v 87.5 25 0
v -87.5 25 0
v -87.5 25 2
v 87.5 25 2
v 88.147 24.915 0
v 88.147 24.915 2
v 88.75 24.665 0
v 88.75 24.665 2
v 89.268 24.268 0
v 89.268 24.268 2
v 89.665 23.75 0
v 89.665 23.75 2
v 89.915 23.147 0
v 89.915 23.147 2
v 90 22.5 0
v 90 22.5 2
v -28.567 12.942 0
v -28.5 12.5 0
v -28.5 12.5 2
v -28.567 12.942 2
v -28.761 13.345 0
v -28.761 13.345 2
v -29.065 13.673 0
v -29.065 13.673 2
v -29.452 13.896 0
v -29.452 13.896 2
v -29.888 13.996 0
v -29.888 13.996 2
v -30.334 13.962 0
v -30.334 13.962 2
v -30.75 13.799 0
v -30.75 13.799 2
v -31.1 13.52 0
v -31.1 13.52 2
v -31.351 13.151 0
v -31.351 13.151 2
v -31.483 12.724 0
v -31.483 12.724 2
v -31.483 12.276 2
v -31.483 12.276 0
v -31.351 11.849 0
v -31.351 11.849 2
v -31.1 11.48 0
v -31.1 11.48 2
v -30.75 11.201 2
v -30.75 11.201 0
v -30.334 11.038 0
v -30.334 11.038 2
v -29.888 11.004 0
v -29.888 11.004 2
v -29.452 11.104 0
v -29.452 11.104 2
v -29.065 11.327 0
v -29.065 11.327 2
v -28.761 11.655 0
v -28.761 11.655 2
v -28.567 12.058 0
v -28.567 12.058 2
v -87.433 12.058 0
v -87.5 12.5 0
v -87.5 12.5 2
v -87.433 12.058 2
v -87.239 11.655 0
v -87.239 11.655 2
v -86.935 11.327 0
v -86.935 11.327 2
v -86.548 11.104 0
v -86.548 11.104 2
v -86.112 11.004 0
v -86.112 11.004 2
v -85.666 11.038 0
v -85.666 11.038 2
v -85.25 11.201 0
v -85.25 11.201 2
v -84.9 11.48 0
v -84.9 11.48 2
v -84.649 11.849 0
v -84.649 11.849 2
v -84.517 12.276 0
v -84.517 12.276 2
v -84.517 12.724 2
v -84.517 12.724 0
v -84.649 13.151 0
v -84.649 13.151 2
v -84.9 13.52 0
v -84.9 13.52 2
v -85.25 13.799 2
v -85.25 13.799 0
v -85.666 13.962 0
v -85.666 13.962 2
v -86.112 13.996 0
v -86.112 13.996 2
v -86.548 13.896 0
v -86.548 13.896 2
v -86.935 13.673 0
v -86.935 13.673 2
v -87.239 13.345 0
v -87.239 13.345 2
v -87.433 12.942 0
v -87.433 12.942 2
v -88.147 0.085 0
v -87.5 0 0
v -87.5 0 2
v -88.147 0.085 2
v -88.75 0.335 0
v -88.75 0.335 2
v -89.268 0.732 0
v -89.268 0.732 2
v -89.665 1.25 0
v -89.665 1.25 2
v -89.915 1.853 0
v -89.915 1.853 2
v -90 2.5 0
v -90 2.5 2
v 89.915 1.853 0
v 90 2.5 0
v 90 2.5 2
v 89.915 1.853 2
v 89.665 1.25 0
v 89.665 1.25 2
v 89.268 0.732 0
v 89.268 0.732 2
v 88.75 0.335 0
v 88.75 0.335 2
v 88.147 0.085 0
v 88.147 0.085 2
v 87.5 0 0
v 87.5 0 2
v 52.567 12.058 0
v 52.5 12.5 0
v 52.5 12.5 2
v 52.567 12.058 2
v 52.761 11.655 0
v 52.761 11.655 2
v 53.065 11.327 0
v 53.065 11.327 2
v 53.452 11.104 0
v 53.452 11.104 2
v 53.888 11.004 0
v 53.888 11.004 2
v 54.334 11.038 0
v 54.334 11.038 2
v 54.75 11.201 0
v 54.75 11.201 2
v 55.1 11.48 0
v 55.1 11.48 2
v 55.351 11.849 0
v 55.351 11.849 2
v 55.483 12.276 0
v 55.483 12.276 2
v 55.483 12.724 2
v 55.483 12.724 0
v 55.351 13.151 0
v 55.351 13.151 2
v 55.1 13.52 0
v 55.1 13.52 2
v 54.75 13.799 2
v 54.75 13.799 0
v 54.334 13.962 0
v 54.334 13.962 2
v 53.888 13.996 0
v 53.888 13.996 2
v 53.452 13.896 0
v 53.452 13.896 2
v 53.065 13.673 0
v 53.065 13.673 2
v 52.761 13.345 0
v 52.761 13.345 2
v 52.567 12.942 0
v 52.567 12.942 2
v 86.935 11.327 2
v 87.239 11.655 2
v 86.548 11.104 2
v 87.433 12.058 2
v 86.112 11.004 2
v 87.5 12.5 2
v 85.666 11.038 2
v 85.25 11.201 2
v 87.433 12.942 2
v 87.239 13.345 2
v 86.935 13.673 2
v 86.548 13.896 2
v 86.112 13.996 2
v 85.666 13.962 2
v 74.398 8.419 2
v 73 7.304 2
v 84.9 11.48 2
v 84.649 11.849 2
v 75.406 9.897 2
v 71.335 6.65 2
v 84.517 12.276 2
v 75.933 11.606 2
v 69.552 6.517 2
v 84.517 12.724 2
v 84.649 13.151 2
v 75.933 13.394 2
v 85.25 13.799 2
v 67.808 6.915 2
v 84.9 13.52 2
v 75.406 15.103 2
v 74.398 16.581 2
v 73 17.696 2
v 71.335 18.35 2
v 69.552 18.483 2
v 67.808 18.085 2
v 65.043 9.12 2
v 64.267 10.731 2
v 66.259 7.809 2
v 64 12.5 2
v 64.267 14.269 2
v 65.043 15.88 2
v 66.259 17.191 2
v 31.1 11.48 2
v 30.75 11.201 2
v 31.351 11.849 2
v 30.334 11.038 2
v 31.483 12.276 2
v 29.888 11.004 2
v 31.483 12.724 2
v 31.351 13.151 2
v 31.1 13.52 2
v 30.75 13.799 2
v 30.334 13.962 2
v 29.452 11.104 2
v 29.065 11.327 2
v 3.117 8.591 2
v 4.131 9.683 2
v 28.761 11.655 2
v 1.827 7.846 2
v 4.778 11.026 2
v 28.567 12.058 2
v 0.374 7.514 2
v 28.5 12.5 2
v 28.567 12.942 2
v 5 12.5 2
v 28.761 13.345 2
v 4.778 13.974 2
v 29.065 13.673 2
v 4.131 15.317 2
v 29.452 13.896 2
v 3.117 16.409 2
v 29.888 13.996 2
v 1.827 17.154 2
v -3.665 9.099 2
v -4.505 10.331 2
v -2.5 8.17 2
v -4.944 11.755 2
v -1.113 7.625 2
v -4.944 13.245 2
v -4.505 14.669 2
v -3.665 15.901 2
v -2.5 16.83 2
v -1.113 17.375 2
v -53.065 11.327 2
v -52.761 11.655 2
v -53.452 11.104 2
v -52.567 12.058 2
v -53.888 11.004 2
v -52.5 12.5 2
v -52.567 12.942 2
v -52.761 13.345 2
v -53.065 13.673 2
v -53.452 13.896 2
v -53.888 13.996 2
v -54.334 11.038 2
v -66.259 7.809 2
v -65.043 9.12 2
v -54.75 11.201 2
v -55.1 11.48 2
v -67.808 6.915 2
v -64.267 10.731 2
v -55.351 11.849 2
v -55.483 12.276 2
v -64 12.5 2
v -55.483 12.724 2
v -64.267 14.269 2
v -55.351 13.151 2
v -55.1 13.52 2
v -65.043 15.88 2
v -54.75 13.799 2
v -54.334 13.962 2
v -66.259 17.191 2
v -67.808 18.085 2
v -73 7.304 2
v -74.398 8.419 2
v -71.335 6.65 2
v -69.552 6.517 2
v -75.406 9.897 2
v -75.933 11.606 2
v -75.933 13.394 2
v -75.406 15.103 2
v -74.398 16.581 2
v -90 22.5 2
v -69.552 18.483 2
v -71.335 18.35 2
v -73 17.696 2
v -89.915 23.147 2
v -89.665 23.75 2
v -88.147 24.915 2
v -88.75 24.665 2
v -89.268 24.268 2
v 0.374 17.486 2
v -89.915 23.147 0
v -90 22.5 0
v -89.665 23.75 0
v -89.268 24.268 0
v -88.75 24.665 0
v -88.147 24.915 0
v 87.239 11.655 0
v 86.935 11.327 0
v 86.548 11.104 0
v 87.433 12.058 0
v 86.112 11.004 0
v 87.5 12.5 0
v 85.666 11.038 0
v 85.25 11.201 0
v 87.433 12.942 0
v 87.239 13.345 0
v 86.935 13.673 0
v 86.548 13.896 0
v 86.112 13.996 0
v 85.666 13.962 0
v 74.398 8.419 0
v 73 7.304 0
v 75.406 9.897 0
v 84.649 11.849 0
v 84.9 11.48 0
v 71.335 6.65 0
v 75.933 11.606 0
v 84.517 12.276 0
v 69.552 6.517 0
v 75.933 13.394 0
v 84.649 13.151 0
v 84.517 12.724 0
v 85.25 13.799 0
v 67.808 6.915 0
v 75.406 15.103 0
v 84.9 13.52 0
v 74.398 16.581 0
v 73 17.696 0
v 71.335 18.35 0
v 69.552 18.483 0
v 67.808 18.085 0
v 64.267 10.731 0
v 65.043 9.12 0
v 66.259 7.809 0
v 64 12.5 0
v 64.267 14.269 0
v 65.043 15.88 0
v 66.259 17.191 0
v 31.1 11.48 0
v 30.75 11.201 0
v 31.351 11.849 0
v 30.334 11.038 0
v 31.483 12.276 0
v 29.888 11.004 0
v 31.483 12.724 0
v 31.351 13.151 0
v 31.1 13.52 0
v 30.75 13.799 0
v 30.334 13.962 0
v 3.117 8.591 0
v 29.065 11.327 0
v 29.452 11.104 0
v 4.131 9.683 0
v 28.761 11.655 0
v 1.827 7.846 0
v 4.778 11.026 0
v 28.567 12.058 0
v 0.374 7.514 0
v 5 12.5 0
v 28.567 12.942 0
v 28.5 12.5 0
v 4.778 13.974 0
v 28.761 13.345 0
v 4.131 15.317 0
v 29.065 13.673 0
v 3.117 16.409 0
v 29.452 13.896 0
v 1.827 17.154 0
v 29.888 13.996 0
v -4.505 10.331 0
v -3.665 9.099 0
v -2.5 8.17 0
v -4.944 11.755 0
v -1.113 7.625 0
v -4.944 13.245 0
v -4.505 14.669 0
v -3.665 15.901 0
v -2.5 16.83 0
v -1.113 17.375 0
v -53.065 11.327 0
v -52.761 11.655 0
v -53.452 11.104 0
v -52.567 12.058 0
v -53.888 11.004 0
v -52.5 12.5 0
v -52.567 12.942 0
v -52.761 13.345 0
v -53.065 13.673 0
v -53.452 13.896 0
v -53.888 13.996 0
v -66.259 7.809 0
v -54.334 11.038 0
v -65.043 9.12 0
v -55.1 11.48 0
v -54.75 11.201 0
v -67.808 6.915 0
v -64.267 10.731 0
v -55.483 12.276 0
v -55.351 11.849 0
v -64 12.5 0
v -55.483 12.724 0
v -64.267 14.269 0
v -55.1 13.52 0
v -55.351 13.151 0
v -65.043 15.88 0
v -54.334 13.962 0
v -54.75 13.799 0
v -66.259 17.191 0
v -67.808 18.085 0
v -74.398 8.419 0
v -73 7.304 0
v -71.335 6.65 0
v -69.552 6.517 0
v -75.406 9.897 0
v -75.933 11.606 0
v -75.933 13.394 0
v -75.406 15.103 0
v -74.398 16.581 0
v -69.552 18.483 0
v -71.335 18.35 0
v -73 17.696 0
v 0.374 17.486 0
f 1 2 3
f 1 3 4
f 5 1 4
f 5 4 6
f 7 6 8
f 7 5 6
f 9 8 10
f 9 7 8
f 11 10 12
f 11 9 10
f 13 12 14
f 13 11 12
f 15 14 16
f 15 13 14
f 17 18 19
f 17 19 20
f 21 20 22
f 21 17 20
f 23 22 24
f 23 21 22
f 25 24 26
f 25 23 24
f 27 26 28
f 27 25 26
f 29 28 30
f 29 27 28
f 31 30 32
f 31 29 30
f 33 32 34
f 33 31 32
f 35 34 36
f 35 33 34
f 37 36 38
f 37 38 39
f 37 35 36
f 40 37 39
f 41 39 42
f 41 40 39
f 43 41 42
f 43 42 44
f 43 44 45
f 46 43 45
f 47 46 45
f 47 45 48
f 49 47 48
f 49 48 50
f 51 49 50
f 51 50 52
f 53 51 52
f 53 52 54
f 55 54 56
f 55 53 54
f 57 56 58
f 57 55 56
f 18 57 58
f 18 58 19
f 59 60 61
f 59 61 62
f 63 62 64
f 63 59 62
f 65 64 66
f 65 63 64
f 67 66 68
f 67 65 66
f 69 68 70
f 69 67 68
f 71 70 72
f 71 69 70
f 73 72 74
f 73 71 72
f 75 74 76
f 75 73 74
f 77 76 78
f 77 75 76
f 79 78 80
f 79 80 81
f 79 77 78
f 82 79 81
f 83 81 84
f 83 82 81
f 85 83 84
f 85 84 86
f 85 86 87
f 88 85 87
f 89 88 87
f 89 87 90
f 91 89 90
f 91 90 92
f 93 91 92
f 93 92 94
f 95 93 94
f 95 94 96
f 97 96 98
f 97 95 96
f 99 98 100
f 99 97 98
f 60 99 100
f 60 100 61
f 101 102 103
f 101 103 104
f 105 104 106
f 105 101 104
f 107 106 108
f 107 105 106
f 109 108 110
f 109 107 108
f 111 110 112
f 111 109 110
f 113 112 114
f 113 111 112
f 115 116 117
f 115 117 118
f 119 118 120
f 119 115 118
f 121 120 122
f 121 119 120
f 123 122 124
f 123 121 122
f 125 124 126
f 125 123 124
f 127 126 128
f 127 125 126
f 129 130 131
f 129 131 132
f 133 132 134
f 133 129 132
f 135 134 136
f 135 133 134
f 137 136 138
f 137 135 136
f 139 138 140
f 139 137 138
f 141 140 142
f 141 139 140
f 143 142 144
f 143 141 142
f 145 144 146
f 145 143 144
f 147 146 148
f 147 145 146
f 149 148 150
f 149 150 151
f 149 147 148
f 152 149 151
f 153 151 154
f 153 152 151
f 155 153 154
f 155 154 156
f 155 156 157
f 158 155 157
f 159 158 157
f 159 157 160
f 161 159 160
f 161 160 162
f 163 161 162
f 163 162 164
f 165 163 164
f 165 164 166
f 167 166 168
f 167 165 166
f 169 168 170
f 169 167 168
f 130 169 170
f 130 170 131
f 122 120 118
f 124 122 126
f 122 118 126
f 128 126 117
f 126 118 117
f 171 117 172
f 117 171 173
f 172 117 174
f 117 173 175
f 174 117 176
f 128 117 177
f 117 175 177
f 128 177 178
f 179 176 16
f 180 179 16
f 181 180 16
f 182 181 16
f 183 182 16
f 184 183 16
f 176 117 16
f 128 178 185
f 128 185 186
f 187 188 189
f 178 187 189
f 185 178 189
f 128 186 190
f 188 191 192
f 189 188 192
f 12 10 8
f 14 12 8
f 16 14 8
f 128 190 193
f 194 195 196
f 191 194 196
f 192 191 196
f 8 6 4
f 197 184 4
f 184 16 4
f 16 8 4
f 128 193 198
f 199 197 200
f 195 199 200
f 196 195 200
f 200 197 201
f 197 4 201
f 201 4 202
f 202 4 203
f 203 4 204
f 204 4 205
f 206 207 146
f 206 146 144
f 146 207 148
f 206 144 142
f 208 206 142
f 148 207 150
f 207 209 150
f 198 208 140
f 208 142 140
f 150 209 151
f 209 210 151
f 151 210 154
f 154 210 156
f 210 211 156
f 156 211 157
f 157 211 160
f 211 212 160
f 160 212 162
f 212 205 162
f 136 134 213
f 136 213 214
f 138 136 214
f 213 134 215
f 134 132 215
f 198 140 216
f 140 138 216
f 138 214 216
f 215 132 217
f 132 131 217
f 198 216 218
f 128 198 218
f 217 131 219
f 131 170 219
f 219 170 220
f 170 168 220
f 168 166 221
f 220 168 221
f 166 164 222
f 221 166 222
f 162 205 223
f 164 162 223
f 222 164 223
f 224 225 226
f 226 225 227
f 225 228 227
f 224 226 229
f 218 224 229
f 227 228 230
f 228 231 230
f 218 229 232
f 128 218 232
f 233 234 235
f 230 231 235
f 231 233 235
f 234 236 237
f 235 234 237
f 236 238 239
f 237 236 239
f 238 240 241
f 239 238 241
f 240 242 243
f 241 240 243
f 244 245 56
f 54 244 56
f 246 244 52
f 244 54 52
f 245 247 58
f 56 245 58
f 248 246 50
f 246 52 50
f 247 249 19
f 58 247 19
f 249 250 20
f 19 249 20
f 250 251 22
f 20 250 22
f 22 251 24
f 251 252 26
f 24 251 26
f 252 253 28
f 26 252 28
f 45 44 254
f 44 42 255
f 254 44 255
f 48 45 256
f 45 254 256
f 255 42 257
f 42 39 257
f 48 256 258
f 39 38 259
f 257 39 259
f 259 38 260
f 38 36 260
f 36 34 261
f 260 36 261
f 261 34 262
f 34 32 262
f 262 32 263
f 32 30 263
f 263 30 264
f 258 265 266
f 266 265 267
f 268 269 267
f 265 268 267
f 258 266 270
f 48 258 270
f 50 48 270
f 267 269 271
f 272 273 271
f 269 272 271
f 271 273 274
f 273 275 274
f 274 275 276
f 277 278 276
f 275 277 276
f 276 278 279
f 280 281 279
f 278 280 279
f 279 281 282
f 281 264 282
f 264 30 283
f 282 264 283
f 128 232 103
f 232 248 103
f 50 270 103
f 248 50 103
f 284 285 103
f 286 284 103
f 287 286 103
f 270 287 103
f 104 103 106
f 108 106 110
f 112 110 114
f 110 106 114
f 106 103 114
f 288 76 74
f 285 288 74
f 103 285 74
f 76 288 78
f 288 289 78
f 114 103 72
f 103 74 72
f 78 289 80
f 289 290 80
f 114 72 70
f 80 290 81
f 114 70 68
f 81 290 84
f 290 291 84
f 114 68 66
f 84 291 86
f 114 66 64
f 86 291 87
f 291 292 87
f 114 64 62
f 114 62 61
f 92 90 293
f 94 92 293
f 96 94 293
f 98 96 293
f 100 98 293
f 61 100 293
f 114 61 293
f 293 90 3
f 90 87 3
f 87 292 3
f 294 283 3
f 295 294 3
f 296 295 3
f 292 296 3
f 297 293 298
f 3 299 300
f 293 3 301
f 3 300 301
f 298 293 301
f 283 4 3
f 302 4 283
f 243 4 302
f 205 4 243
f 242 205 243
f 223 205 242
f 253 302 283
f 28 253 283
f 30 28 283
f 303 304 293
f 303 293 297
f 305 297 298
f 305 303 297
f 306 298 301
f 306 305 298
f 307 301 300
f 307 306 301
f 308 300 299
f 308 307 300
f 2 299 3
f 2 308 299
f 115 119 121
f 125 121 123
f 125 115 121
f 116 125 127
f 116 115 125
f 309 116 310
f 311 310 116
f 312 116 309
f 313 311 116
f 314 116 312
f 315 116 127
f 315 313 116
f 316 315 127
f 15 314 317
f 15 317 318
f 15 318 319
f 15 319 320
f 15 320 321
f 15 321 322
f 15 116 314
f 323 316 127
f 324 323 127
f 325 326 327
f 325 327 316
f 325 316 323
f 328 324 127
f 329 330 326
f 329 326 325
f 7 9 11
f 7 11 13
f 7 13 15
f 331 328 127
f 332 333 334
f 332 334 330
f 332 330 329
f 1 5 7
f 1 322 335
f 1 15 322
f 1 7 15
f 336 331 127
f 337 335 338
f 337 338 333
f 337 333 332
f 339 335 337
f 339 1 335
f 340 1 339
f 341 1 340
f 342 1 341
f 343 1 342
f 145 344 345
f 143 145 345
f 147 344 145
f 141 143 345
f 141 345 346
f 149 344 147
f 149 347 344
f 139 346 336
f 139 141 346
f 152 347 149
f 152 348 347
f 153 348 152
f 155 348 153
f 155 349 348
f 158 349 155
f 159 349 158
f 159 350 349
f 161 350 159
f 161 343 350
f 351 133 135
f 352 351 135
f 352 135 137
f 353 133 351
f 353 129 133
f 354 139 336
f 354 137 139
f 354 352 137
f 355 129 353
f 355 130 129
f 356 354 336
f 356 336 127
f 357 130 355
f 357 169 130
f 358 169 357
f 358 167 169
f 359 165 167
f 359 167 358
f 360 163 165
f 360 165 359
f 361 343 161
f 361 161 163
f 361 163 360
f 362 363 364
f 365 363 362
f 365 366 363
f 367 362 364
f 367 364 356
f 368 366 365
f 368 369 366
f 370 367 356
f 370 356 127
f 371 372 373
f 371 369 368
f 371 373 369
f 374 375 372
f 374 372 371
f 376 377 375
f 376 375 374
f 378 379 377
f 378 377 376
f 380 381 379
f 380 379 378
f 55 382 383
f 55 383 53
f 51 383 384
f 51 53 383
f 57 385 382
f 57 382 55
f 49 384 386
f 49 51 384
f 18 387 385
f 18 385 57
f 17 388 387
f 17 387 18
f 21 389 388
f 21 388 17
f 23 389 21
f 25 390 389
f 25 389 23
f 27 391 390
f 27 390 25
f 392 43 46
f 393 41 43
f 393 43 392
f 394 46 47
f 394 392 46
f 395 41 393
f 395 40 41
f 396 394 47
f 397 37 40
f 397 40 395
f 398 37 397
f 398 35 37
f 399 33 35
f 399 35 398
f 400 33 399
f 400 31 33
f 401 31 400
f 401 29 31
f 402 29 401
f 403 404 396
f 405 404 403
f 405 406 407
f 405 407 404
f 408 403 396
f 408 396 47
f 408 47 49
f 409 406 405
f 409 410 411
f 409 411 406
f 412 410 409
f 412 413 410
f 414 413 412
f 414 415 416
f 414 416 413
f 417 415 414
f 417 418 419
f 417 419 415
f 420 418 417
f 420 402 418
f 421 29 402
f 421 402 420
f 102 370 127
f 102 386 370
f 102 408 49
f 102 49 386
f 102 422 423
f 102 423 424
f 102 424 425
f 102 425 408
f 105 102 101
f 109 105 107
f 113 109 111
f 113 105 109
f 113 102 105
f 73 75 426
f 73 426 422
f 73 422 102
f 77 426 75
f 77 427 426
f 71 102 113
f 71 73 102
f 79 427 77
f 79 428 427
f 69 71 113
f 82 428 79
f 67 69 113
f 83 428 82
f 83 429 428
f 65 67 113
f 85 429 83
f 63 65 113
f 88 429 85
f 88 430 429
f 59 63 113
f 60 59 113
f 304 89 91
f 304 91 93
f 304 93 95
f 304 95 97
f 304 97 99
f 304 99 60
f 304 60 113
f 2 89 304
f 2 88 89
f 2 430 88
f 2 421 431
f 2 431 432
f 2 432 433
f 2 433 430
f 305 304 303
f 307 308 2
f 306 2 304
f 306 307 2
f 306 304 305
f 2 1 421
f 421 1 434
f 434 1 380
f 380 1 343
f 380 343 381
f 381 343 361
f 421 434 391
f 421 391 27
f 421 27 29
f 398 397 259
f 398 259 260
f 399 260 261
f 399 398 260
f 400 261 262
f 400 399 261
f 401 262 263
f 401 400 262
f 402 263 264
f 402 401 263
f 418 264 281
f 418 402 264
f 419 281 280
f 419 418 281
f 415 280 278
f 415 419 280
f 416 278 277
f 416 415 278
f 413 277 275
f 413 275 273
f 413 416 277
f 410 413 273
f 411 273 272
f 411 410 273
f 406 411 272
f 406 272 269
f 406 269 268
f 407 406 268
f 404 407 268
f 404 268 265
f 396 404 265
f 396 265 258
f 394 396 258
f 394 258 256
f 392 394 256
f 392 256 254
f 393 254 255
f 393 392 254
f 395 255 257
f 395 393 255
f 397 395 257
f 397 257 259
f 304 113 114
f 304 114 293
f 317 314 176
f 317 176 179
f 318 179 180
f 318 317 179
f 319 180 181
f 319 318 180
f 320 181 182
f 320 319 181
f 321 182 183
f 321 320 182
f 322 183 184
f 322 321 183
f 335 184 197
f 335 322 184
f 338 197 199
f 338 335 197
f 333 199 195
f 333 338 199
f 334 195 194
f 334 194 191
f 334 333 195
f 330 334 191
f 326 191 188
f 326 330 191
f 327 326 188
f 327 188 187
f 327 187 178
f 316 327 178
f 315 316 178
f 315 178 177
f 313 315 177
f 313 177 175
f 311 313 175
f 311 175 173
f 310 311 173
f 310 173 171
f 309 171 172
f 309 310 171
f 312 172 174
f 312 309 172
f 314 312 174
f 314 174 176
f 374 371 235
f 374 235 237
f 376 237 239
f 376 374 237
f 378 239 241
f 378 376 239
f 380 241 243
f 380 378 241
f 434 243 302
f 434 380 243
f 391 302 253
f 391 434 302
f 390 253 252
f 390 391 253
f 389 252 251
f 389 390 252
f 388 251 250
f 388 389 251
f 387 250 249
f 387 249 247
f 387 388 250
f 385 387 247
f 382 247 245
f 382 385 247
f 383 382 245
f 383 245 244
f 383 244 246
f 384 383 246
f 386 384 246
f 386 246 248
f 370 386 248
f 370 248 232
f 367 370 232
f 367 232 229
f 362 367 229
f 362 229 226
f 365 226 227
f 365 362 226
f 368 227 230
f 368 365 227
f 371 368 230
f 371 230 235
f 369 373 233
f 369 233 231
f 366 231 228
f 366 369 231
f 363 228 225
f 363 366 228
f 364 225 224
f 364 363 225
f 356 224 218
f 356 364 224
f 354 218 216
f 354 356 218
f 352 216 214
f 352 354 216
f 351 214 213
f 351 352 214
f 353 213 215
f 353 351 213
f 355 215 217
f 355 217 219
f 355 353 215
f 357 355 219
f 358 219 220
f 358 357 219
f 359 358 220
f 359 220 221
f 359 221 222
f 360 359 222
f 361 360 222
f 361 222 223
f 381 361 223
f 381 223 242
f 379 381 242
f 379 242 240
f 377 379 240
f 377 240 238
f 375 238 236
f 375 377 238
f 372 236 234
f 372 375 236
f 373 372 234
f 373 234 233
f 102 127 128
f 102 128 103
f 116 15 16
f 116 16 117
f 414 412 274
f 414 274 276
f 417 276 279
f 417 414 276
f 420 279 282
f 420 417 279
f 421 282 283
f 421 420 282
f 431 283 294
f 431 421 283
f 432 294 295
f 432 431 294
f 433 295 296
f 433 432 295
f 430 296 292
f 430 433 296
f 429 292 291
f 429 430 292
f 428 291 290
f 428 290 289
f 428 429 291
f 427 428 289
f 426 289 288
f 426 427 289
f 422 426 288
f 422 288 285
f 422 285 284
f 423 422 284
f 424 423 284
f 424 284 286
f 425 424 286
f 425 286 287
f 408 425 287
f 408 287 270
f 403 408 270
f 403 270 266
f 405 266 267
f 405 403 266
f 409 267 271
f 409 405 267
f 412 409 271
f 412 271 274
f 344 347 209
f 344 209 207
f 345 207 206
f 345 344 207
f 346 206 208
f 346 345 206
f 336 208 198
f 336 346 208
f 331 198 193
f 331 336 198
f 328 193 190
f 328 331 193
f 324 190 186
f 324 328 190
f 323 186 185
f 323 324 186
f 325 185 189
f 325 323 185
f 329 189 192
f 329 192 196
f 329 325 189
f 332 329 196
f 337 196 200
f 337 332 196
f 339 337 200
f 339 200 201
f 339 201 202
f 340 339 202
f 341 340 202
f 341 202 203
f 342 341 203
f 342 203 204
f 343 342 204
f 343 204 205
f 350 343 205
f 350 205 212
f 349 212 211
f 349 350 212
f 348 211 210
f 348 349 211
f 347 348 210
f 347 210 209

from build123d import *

# Parameters (mm, degrees)
MODEL_R             = 1.5
MODEL_R_2           = 5
MODEL_R_3           = 6
BOSS_EXTRUDE1_DEPTH = 2


with BuildPart() as part:
    # Model → Boss-Extrude1 (new body)
    with BuildSketch(Plane.XY):
        with BuildLine():
            Line((-87.5, 25), (87.5, 25))
            ThreePointArc((87.5, 25), (89.267766953, 24.267766953), (90, 22.5))
            Line((90, 22.5), (90, 2.5))
            ThreePointArc((90, 2.5), (89.267766953, 0.732233047), (87.5, 0))
            Line((87.5, 0), (-87.5, 0))
            ThreePointArc((-87.5, 0), (-89.267766953, 0.732233047), (-90, 2.5))
            Line((-90, 2.5), (-90, 22.5))
            ThreePointArc((-90, 22.5), (-89.267766953, 24.267766953), (-87.5, 25))
        make_face()
        with Locations((86, 12.5)):
            Circle(MODEL_R, mode=Mode.SUBTRACT)
        with Locations(Location((-86, 12.5, 0), (0, 0, 180))):
            Circle(MODEL_R, mode=Mode.SUBTRACT)
        with Locations((0, 12.5)):
            Circle(MODEL_R_2, mode=Mode.SUBTRACT)
        with Locations((-70, 12.5)):
            Circle(MODEL_R_3, mode=Mode.SUBTRACT)
        with Locations(Location((70, 12.5, 0), (0, 0, 180))):
            Circle(MODEL_R_3, mode=Mode.SUBTRACT)
        with Locations((-54, 12.5)):
            Circle(MODEL_R, mode=Mode.SUBTRACT)
        with Locations(Location((54, 12.5, 0), (0, 0, 180))):
            Circle(MODEL_R, mode=Mode.SUBTRACT)
        with Locations((-30, 12.5)):
            Circle(MODEL_R, mode=Mode.SUBTRACT)
        with Locations(Location((30, 12.5, 0), (0, 0, 180))):
            Circle(MODEL_R, mode=Mode.SUBTRACT)
    extrude(amount=BOSS_EXTRUDE1_DEPTH)


solid = part.part
